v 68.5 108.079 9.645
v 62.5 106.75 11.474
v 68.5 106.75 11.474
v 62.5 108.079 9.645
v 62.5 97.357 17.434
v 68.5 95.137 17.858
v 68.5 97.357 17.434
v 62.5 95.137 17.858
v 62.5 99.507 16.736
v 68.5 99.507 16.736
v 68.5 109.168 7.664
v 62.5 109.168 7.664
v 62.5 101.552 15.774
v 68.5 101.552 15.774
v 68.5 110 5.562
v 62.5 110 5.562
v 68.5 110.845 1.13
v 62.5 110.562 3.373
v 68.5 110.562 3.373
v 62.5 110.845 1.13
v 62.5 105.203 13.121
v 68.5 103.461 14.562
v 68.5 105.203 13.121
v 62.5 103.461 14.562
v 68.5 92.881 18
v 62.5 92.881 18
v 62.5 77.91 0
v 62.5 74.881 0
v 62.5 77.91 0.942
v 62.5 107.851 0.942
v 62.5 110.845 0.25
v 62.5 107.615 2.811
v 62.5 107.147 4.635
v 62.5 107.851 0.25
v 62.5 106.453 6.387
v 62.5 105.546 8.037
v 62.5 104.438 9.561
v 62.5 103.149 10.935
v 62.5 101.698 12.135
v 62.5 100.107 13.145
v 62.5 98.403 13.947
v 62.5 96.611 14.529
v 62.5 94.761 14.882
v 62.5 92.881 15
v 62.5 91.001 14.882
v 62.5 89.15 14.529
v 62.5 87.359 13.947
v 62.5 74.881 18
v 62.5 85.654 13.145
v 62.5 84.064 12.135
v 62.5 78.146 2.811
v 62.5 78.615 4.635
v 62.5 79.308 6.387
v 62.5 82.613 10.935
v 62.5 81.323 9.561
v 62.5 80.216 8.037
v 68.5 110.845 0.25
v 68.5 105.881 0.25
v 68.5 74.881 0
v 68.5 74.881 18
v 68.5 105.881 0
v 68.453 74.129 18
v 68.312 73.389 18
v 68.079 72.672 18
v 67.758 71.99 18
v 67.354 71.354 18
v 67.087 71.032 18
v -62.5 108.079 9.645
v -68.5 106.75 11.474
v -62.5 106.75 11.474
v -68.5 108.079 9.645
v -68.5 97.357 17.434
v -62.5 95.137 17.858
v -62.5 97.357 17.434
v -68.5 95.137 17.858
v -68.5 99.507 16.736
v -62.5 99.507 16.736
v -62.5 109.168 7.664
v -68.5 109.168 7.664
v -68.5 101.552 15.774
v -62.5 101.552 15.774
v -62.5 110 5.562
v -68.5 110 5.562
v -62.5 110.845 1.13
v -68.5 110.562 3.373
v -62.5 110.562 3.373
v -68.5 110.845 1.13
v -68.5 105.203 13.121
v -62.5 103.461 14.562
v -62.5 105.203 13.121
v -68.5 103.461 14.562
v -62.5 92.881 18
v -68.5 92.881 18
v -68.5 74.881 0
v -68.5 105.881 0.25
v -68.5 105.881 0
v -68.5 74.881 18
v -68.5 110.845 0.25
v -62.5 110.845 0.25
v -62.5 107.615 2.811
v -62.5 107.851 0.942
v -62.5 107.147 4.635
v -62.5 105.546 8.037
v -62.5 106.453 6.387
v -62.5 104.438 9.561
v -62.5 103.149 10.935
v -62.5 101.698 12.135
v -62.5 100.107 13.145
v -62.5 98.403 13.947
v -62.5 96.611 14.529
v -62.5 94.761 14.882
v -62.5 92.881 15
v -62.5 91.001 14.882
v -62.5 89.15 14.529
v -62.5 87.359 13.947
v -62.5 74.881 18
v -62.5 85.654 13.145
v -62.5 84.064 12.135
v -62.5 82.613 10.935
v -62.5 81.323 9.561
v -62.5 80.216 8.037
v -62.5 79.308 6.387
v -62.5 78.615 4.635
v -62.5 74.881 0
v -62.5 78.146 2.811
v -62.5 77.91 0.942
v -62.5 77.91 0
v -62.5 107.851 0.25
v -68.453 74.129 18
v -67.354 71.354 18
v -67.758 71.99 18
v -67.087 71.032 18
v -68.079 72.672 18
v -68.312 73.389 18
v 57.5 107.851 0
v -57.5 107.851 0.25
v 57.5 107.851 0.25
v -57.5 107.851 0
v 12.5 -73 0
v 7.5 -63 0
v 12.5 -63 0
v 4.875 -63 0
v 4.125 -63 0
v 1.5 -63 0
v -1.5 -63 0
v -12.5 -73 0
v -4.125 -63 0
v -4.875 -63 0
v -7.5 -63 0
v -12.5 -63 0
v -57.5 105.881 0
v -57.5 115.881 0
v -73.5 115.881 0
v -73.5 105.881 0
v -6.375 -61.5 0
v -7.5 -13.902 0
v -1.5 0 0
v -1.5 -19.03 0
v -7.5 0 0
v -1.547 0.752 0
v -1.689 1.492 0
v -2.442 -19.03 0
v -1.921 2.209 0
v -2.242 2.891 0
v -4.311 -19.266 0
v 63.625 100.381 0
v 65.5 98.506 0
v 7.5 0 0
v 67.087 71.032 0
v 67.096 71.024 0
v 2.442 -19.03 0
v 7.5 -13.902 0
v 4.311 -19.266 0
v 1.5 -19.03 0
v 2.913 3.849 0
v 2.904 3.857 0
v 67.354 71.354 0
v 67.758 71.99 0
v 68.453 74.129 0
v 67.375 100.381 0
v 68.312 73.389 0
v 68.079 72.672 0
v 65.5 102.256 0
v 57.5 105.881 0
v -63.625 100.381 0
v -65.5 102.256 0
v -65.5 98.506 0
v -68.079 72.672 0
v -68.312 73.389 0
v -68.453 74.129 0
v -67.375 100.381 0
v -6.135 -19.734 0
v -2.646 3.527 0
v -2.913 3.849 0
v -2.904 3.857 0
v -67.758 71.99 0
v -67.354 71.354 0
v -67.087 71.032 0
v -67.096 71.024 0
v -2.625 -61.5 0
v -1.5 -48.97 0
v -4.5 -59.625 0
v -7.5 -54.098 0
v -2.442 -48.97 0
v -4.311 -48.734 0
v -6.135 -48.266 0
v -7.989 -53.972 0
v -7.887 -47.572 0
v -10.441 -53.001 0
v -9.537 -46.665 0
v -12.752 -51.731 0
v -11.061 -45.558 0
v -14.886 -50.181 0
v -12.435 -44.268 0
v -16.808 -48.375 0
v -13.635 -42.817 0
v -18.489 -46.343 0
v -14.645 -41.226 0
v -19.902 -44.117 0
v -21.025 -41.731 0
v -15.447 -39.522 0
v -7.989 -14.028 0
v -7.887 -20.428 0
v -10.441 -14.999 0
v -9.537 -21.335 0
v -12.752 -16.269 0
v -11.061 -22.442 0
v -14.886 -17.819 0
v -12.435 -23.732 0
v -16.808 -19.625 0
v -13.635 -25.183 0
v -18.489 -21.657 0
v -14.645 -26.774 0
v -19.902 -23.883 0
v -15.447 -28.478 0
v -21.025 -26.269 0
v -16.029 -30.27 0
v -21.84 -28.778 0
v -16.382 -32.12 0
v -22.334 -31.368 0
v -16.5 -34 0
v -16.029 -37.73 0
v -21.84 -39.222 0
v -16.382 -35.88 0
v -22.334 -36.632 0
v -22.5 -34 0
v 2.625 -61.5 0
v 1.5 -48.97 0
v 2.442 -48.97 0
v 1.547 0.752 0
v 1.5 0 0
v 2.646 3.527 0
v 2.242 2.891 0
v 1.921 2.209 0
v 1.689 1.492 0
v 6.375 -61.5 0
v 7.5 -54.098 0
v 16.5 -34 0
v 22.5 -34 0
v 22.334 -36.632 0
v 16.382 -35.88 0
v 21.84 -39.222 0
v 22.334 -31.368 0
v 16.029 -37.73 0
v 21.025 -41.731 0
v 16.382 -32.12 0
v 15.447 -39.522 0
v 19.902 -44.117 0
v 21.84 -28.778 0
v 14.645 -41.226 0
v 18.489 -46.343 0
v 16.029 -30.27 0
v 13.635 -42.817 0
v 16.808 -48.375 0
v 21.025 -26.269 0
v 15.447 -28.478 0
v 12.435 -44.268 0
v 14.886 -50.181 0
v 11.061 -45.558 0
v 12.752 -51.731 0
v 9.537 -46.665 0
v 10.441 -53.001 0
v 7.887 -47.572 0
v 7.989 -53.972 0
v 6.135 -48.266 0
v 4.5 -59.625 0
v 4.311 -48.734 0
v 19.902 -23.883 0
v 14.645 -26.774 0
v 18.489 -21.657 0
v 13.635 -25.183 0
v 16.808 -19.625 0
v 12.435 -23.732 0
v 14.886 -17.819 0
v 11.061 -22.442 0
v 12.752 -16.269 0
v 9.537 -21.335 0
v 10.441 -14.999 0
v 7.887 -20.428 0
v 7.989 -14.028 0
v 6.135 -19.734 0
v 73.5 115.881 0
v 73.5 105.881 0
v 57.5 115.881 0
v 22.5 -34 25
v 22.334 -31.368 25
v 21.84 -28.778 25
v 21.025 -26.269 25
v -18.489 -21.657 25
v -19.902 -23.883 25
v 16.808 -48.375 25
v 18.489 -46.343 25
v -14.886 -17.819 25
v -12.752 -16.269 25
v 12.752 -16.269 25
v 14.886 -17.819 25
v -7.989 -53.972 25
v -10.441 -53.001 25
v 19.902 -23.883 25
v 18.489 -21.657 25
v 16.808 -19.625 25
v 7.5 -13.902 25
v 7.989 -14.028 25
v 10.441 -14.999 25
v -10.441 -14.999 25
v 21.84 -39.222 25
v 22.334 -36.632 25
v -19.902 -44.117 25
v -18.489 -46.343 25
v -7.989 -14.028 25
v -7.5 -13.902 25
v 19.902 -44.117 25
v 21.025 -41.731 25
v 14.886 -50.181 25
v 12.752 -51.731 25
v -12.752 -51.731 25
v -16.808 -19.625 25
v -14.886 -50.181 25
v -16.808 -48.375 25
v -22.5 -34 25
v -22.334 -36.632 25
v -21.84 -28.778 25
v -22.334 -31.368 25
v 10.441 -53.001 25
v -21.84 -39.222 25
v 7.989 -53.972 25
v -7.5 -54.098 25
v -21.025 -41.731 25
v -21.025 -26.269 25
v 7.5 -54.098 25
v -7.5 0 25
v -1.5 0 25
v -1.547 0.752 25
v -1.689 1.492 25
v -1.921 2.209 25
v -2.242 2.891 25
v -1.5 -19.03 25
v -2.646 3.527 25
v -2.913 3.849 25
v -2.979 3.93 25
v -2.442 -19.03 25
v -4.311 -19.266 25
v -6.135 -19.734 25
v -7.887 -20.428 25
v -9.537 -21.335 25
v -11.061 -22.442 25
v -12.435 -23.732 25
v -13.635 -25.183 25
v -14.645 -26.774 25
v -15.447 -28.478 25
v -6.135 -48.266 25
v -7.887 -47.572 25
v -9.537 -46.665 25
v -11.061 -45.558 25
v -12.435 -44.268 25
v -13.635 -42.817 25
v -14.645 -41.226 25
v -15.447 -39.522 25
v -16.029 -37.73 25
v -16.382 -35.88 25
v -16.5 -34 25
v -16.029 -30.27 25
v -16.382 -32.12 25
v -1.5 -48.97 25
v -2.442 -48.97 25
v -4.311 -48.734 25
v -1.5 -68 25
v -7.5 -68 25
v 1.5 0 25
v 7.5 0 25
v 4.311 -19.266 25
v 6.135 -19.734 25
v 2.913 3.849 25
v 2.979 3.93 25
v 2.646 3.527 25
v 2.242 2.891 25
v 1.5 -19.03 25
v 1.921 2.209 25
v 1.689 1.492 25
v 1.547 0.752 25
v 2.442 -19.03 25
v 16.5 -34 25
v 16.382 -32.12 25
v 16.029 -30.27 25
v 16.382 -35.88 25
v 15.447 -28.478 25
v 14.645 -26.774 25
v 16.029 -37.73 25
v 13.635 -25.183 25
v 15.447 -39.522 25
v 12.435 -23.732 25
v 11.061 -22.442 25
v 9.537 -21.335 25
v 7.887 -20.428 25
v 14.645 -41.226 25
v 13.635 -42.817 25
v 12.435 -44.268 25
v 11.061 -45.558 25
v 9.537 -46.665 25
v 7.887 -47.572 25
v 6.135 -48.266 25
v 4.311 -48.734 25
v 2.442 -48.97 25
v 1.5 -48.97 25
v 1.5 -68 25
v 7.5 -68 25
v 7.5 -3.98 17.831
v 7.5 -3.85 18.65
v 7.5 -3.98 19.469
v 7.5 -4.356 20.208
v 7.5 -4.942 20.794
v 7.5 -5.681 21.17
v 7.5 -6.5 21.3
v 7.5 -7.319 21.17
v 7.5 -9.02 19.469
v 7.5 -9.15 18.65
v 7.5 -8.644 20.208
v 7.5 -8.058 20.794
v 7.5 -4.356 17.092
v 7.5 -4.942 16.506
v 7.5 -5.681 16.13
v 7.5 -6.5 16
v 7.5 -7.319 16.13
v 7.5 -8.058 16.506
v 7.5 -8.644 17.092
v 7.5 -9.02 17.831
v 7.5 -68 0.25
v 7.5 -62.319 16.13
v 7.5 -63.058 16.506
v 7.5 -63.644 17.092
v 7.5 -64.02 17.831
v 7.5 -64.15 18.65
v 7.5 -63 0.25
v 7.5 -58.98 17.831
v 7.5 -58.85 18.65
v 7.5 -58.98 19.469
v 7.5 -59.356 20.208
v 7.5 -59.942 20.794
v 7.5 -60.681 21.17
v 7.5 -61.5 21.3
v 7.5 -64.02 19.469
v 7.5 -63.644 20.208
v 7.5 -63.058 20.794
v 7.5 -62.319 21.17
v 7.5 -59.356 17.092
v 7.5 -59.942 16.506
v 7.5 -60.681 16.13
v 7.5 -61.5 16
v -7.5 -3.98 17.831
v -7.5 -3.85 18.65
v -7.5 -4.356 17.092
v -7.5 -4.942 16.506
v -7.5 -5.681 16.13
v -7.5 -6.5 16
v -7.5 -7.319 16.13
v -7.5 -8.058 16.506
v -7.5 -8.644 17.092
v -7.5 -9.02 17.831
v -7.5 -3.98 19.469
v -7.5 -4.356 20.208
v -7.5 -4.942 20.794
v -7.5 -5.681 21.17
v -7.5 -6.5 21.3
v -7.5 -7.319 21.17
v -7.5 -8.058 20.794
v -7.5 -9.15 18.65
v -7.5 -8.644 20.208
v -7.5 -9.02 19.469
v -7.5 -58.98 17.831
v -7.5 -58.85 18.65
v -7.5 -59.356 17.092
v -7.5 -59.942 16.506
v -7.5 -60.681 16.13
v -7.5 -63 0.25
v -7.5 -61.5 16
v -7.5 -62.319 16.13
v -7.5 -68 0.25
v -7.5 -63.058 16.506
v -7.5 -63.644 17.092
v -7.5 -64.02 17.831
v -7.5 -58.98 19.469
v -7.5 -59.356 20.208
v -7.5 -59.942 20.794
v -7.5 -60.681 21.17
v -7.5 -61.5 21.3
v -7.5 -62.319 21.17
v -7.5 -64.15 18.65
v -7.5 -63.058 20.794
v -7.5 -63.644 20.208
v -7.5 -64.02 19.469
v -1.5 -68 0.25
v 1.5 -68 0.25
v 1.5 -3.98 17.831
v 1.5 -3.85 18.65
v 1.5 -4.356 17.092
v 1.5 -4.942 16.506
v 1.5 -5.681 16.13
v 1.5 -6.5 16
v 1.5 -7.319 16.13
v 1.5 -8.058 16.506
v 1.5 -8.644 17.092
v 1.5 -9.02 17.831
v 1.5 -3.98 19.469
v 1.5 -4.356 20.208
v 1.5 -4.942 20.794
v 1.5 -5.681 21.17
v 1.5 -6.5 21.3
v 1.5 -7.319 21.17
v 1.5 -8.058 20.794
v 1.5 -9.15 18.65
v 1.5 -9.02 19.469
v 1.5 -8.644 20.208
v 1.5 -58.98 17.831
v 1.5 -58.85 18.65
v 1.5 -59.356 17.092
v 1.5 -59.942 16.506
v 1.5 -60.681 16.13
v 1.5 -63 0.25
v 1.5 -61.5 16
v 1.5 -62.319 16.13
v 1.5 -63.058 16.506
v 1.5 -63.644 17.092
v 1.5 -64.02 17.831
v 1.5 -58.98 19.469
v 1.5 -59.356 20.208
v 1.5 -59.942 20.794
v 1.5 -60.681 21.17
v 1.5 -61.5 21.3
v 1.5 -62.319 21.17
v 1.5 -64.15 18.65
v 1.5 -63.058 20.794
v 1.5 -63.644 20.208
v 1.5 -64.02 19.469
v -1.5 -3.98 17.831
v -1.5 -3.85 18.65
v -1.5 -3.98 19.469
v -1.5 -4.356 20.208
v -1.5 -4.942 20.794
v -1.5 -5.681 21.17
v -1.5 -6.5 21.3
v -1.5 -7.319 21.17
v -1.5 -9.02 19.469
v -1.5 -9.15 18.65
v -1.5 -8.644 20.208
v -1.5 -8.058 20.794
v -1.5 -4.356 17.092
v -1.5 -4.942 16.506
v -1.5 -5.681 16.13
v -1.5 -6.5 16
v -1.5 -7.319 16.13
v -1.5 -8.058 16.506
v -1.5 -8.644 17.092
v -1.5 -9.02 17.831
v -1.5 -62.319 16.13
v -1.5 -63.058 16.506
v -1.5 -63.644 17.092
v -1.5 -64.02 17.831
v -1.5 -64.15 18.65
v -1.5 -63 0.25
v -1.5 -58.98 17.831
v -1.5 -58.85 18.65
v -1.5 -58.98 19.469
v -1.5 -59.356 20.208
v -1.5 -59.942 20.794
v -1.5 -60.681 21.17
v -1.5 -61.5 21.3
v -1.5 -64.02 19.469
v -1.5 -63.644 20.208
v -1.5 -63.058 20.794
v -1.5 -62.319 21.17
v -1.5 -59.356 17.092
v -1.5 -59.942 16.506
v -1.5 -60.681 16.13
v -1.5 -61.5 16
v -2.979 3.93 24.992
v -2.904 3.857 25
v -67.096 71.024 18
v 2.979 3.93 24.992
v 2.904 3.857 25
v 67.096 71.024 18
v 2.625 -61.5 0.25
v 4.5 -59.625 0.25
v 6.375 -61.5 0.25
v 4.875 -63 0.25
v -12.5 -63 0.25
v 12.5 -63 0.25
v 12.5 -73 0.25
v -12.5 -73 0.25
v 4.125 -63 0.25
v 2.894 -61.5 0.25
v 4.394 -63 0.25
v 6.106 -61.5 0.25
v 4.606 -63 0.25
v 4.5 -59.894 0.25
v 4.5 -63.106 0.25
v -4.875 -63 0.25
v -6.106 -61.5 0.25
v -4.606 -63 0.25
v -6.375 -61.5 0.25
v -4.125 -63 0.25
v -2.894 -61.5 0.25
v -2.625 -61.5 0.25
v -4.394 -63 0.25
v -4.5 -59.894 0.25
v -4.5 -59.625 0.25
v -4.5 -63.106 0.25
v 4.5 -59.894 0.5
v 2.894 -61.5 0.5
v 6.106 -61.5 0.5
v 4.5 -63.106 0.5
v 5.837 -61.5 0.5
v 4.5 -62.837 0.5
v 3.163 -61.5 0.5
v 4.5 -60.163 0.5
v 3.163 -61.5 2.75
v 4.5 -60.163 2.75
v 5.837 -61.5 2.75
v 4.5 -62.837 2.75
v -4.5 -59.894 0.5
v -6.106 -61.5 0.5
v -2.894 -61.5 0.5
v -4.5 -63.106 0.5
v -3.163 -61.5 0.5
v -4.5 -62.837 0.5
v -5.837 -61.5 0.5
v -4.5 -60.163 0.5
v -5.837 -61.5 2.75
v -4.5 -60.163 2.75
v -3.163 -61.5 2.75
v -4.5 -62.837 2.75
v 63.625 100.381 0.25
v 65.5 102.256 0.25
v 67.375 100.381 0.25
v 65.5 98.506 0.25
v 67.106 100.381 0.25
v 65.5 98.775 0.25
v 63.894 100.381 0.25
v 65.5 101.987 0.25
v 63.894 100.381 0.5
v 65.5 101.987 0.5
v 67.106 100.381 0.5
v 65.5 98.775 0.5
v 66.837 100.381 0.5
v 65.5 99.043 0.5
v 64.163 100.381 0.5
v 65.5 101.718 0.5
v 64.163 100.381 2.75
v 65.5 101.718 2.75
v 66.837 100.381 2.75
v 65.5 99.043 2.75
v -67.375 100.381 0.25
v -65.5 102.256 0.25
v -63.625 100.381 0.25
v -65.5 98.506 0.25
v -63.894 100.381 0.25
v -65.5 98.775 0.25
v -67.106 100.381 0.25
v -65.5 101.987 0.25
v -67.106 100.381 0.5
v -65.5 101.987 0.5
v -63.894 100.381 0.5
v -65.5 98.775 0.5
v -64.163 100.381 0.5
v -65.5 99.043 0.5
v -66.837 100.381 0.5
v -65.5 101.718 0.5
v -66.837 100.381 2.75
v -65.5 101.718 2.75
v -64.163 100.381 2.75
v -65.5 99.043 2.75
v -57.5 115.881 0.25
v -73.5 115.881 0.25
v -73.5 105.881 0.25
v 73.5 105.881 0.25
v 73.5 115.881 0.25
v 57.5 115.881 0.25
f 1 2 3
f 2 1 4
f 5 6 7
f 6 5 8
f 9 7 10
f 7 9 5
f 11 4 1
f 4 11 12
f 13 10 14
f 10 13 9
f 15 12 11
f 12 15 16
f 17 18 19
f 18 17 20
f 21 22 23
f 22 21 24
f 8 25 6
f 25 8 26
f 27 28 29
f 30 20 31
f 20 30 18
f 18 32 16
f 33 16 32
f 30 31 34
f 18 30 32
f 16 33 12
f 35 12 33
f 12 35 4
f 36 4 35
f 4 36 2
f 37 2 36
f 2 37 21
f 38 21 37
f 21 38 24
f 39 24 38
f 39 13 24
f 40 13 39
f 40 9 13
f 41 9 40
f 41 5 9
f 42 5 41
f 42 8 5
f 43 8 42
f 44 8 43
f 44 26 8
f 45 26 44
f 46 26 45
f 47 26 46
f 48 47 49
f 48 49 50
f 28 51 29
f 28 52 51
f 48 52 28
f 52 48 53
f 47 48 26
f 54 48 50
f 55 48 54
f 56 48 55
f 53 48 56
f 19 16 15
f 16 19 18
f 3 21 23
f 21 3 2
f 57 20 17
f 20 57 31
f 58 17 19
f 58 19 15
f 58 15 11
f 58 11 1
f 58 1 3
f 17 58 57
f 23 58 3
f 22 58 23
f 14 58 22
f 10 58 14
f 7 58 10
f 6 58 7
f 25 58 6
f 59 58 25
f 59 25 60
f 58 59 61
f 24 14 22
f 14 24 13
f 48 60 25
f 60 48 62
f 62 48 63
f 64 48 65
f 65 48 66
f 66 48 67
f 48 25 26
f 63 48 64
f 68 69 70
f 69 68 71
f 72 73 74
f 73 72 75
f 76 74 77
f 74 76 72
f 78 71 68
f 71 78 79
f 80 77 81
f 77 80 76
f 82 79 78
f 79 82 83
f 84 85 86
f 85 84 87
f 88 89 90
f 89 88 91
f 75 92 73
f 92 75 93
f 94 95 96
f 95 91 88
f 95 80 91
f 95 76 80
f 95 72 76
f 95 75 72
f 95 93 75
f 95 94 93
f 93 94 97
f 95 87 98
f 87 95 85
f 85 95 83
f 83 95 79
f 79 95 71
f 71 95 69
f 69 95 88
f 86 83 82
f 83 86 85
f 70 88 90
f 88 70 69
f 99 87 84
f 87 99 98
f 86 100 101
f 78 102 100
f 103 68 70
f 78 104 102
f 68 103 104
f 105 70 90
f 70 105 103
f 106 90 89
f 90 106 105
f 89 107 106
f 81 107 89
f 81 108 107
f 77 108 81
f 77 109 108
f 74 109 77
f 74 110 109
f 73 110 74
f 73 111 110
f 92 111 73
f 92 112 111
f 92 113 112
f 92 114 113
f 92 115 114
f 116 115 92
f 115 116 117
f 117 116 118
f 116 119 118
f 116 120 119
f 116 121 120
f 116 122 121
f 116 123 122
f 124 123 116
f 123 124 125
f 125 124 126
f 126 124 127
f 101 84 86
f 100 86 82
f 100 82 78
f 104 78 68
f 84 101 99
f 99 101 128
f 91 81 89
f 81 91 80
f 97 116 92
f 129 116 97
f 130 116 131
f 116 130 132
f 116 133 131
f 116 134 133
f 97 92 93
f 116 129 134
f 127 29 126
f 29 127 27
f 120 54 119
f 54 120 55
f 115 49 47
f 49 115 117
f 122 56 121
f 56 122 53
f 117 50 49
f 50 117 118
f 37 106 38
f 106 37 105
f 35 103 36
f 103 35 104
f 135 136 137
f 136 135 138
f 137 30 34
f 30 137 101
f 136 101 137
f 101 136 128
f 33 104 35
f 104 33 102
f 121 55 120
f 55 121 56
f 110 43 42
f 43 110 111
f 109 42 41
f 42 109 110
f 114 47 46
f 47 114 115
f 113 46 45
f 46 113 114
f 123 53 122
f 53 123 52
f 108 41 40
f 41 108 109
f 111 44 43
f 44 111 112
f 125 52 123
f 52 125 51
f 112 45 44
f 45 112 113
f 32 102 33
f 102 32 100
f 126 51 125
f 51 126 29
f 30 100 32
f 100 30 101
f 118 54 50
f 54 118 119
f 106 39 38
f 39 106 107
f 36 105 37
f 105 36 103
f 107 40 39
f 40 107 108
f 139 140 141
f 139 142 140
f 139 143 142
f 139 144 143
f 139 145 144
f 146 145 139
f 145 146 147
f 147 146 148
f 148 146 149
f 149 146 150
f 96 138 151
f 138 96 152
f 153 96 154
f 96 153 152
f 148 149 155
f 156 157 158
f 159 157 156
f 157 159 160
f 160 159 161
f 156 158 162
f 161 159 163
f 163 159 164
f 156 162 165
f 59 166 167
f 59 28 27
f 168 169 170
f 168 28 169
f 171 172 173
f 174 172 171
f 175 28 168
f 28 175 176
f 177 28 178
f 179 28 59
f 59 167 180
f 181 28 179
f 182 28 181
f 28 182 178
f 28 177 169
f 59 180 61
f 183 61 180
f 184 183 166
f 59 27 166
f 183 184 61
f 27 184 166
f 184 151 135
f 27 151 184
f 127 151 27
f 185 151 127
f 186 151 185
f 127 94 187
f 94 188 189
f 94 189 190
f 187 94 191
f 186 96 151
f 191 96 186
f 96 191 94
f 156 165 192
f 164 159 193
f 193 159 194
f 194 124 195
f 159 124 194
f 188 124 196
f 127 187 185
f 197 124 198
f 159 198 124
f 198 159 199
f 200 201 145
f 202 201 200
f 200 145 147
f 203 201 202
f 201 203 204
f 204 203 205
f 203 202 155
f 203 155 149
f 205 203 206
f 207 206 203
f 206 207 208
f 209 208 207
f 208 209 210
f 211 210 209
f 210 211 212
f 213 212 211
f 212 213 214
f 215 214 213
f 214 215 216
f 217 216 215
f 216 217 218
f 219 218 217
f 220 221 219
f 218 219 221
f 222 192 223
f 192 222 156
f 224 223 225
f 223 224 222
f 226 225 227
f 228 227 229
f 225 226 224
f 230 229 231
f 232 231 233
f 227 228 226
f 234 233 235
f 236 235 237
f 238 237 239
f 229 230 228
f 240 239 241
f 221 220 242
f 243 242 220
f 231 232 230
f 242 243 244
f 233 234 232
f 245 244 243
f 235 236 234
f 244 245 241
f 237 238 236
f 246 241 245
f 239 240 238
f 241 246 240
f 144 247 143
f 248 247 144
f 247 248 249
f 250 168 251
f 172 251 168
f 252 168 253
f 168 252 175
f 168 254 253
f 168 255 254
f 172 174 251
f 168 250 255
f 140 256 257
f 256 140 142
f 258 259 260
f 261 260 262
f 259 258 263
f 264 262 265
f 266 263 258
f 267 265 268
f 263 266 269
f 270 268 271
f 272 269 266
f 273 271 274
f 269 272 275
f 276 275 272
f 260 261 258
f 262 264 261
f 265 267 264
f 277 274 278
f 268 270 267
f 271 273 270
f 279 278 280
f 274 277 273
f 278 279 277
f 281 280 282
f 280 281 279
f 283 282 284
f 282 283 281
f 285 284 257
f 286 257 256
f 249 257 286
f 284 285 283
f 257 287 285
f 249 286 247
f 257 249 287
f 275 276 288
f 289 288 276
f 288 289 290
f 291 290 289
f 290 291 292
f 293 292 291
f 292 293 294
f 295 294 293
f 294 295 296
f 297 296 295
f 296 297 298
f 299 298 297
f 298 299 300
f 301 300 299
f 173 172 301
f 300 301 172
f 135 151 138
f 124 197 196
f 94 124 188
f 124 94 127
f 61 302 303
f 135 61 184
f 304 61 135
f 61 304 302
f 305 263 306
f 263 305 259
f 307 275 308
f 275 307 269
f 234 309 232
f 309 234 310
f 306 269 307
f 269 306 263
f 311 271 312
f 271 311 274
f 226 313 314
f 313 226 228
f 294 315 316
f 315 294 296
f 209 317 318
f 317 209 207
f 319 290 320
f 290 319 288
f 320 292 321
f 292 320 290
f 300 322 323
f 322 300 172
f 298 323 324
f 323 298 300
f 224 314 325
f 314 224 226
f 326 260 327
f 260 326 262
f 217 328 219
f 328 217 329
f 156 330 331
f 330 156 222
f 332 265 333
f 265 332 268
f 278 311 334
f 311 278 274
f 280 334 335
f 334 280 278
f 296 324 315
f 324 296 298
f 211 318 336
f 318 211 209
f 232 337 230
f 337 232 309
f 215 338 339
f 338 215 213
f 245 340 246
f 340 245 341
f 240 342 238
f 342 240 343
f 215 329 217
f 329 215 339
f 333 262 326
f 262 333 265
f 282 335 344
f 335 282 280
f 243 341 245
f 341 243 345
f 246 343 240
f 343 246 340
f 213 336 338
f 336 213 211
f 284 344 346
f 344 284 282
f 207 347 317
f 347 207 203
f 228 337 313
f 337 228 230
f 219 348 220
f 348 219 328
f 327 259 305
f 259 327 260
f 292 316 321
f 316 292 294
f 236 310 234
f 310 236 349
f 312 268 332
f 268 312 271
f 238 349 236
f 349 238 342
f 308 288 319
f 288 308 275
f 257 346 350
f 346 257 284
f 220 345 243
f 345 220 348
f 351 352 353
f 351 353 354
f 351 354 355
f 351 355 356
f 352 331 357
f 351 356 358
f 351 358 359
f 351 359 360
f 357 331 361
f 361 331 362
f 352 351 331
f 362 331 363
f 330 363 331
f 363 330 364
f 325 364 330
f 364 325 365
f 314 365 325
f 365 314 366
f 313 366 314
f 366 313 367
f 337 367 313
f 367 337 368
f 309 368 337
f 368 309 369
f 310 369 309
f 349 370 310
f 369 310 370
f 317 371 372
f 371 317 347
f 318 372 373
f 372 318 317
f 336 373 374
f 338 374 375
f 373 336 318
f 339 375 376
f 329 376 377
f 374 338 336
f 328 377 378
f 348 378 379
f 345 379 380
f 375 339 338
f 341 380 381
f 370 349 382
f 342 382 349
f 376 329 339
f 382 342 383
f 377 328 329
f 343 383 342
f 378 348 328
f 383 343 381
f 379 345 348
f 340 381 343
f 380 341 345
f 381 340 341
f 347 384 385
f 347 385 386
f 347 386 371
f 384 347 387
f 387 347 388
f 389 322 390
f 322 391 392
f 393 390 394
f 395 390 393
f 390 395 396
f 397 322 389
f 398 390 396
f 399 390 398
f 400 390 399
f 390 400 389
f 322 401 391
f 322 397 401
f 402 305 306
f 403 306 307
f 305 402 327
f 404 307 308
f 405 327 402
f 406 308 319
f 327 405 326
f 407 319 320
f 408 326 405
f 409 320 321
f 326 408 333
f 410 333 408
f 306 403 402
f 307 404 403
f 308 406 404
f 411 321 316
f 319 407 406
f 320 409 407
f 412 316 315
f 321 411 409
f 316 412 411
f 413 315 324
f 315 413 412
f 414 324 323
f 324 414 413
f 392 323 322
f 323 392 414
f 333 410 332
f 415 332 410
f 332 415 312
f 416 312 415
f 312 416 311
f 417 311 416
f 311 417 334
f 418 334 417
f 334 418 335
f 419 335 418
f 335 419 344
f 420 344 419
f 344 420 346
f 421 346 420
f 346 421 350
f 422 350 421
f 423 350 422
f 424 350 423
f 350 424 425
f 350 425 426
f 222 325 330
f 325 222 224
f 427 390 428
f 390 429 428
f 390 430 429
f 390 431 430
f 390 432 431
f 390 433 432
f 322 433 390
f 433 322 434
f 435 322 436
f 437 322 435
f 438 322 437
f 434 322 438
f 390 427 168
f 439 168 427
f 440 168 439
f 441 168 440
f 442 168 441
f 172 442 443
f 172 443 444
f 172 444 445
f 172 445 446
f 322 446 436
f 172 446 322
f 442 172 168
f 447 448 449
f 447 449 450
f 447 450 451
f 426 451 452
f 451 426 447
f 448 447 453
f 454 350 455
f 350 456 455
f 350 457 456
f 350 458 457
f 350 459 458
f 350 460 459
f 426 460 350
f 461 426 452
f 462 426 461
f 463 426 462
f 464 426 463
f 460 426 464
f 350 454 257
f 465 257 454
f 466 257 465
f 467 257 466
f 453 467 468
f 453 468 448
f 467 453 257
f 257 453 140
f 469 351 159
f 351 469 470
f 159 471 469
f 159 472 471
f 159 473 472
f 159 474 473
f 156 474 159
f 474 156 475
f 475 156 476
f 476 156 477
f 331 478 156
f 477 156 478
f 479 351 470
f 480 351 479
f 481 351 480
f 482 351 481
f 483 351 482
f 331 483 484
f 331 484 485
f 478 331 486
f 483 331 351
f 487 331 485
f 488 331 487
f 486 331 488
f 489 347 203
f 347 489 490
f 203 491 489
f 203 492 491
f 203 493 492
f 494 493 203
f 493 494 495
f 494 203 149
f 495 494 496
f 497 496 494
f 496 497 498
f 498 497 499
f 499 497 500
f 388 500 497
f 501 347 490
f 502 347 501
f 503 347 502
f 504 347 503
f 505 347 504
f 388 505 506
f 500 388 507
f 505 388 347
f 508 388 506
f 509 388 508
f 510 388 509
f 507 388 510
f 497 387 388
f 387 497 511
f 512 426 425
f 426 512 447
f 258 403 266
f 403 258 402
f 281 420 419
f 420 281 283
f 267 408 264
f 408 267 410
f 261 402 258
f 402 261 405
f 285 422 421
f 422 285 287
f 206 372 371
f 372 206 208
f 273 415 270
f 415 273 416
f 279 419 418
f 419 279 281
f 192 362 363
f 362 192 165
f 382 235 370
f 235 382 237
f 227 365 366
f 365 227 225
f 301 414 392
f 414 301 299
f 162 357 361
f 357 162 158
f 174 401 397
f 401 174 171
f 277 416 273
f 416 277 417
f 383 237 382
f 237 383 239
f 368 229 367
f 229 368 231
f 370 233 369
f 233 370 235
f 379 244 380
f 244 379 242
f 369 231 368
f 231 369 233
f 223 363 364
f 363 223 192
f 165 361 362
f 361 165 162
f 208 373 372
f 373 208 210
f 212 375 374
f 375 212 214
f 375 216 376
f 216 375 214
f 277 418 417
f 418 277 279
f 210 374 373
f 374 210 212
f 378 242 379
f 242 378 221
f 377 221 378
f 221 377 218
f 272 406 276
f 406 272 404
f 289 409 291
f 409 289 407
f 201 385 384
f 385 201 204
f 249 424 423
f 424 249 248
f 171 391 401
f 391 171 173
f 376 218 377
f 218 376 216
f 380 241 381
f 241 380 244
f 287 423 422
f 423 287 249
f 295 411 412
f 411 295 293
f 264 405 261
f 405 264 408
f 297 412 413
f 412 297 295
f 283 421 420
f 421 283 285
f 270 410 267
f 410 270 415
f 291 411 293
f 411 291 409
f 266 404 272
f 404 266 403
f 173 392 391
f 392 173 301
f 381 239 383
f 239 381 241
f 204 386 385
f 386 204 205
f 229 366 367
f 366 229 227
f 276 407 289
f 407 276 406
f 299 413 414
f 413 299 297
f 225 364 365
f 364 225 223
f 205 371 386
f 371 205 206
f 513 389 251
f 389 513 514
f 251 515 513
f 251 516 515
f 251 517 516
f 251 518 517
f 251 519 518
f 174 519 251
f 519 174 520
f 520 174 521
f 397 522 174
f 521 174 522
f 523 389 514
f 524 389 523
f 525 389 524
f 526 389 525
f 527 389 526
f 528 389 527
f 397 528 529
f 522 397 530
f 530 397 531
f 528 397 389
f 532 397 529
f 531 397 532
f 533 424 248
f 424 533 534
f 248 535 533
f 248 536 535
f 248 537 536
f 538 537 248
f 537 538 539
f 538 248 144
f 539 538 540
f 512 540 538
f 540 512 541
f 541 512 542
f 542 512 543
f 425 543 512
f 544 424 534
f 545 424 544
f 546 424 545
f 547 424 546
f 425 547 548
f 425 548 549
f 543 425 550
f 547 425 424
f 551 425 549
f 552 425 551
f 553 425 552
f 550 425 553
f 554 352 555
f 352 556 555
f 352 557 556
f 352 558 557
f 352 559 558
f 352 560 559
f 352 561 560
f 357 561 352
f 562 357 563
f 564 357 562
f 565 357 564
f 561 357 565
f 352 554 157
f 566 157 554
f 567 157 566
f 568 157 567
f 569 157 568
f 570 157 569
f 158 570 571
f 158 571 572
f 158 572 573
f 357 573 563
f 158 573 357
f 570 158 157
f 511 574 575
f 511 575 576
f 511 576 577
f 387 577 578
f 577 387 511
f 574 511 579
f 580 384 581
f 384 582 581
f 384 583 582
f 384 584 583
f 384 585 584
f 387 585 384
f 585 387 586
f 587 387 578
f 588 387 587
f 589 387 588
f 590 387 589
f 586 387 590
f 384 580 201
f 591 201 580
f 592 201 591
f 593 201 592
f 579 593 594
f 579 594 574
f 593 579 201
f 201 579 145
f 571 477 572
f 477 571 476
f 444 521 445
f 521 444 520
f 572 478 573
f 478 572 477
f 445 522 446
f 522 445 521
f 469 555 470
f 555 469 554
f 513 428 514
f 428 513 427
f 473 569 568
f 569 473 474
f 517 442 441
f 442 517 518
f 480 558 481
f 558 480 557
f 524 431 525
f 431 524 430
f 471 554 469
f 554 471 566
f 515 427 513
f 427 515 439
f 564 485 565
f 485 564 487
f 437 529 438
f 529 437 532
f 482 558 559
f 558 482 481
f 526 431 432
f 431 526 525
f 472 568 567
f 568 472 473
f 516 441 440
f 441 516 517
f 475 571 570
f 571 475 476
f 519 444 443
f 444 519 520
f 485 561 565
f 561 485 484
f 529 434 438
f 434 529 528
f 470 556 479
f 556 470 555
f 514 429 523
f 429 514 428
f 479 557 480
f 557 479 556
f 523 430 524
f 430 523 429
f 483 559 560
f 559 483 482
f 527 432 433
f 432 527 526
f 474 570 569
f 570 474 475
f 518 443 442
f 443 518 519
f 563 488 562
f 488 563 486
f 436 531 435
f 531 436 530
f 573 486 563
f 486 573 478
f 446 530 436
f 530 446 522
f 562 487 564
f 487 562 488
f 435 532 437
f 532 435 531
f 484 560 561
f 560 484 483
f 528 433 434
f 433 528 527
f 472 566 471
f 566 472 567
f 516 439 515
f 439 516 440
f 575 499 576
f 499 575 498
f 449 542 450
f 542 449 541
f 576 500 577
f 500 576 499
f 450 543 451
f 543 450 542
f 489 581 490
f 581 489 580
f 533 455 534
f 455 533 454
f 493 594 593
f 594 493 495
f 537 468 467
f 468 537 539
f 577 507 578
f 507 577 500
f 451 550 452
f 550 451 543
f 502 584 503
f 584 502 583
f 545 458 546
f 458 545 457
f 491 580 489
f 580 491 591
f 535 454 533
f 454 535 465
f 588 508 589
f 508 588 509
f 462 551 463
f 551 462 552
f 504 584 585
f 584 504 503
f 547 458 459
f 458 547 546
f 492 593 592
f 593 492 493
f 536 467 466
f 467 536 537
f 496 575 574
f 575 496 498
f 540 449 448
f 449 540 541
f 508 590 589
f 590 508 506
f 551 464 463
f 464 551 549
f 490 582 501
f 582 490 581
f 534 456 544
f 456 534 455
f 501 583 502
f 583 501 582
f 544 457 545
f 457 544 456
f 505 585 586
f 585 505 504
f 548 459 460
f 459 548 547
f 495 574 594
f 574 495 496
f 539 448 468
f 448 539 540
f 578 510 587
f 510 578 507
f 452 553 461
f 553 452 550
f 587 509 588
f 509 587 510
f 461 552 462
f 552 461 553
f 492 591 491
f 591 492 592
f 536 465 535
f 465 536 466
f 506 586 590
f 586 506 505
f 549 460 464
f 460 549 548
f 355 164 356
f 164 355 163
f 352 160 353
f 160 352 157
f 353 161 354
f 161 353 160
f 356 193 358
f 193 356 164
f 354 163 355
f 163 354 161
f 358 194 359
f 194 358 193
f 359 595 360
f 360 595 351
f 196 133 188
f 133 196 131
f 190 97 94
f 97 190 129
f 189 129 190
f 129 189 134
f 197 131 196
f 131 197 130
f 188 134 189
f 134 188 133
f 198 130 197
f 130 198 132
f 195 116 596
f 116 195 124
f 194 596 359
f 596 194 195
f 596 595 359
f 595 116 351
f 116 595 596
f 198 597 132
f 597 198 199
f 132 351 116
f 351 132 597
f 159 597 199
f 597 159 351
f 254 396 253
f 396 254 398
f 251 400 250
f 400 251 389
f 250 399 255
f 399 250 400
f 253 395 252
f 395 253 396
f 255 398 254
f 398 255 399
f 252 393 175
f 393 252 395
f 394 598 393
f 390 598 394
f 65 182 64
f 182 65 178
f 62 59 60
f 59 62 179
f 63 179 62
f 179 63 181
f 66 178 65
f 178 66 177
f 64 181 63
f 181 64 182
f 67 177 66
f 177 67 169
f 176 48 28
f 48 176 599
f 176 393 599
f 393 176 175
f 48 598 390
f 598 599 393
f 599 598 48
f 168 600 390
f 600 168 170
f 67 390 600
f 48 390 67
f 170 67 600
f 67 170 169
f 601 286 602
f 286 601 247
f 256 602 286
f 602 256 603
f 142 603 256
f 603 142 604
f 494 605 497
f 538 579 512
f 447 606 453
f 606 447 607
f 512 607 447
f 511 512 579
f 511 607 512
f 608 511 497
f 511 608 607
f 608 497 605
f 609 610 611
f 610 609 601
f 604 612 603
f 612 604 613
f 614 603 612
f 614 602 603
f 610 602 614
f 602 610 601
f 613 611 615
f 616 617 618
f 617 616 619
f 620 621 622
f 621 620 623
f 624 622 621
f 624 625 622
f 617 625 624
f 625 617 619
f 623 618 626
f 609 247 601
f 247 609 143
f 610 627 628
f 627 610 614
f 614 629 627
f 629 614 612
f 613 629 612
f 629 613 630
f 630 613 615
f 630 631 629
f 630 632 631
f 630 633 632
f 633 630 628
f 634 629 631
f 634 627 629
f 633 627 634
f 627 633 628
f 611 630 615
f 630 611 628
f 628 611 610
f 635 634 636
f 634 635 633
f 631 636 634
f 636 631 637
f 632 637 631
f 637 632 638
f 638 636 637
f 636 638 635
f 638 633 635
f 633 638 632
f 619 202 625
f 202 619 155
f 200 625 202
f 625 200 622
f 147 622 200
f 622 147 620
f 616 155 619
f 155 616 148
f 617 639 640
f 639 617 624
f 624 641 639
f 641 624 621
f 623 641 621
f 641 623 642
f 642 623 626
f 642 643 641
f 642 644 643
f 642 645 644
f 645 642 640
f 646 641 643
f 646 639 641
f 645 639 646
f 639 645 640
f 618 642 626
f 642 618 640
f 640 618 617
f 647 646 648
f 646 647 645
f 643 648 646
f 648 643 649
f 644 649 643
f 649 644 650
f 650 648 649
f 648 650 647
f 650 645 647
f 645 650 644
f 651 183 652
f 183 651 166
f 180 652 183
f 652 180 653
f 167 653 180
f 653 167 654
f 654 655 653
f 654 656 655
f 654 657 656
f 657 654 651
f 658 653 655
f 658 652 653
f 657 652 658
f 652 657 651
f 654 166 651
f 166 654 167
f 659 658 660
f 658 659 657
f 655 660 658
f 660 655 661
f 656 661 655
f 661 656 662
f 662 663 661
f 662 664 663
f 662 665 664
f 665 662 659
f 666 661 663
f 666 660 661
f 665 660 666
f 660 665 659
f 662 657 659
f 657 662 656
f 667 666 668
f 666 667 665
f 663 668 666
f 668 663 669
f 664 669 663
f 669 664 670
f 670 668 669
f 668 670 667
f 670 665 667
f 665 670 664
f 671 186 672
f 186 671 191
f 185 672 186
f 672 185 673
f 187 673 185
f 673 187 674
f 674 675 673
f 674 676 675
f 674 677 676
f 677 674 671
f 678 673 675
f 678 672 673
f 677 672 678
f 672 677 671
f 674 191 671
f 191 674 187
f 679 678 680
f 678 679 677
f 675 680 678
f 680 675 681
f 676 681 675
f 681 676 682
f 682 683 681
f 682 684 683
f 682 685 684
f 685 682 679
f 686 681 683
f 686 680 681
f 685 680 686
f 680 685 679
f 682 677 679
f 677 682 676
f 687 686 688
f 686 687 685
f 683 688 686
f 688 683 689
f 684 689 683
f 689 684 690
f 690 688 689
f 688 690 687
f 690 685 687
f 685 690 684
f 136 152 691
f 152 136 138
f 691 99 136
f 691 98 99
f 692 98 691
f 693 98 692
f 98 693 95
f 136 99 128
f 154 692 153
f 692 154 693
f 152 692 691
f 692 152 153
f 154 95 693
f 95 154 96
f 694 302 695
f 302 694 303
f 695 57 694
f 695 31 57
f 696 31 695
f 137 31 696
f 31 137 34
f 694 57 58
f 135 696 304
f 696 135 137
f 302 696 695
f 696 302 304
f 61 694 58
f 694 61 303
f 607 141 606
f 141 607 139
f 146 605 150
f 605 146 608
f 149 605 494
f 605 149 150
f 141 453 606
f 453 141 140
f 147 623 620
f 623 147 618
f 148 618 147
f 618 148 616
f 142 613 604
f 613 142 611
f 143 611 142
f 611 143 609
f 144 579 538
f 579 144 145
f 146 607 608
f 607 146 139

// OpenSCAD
/* [General] */

// "whole" gives you the entire part, to be printed as a piece. It can be difficult to print. "split" gives you the top half of the part, for you to print twice and glue together.
layout = "split"; // [whole, split]

// Thickness of all the walls except the handle cylinder.
wall_thickness = 6;

// Specify the diameter of your filament. Holes are provided for alignment pins to aid in gluing, if printing in halves. Put in pieces of filament in the alignment holes to help you glue the halves. If you're going to do this, measure your filament.
pin_diameter = 1.75;

// Extra clearance for alignment pins.
hole_clearance = 0.1;

// Also need to know the layer height you are printing at.
layer_height = 0.25;

// And the extrusion width.
extrusion_width = 0.38;

/* [Handle] */
handle_length = 125;
handle_outer_diameter = 30;

// Determines size of hole in handle. If you don't want a hole in the handle, make this greater than or equal to handle_outer_diameter / 2.
handle_wall_thickness = 15;

// Set this to zero to require fewer supports if printing as one piece.
handle_flange_border = 3;

/* [Clamp] */
// Diameter of the thing you're going to be clamping onto.
clamp_inner_diameter = 30;

// Setting clamp_length to handle_outer_diameter + 2*handle_flange_border will reduce the number of supports required.
clamp_length = 50; 

// Resting distance between the clamps. Don't make this too big, or you won't be able to bring the clamps together properly. Too small, though, and you may not be able to get it around your object. Partly depends on the material you are using, and the wall thickness you have chosen.
clamp_gap = 3;

// #10 screws
screw_od = 5.1;

// and #10 washers
washer_od = 12.7;

// Allow enough space to fit your washers. Wing nut screws may require some more clearance.
clamp_flange_length = 13;

// Angle from vertical for the sidewalls.
side_angle = 40;

/* [Hidden] */
// To avoid coincident faces.
slop = 1;
$fn = 50;
clamp_outer_diameter = clamp_inner_diameter + 2 * wall_thickness;


module screw() {
    rotate([0, 90, 0])
    cylinder(r = screw_od/2 + hole_clearance, h = clamp_gap + 2*wall_thickness + 2*slop, center = true, $fn = 20);
}

module clamp() {
  screw_z = clamp_length/2 - washer_od/2;
  screw_y = clamp_inner_diameter/2 + wall_thickness + clamp_flange_length / 2;

  difference() {
    union() {
      // Clamp outside shell
      hull() {
        translate([-clamp_gap/2, 0, 0])
        cylinder(h = clamp_length, r = clamp_outer_diameter/2, center = true);

        translate([clamp_gap/2, 0, 0])
        cylinder(h = clamp_length, r = clamp_outer_diameter/2, center = true);
      }

      // Flange
      cube([clamp_gap + 2*wall_thickness, clamp_outer_diameter + 2*clamp_flange_length, clamp_length], center = true);
    }
    // Clamp hole
    hull() {
      translate([-clamp_gap/2, 0, 0])
      cylinder(h = clamp_length + slop, r = clamp_inner_diameter/2, center = true);

      translate([clamp_gap/2, 0, 0])
      cylinder(h = clamp_length + slop, r = clamp_inner_diameter/2, center = true);
    }

    // Gap
    cube([clamp_gap, clamp_outer_diameter + 2*clamp_flange_length + slop, clamp_length + slop], center = true);

    // Screw holes
    translate([0, screw_y, screw_z]) screw();
    translate([0, screw_y, -screw_z]) screw();    
    translate([0, -screw_y, screw_z]) screw();
    translate([0, -screw_y, -screw_z]) screw();
  }
}

handle_flange_length = handle_outer_diameter + 2*handle_flange_border;

module handle_flange() {
  cylinder(h = wall_thickness, r = handle_flange_length/2);

  translate([-handle_flange_length/2, -handle_flange_length/2, 0])
  cube([handle_flange_length, handle_flange_length/2, wall_thickness]);
}

module handle() {
  translate([0, handle_flange_length/2, 0])
  rotate([0, 90, 0])
  difference() {
    union() {
      // Handle outer shell
      cylinder(h = handle_length, r = handle_outer_diameter/2, center = true);

      // Flanges
      translate([0, 0, handle_length/2])
      handle_flange();

      translate([0, 0, -handle_length/2 - wall_thickness])
      handle_flange();
    }
    cylinder(h = handle_length + 2*wall_thickness + slop, r = handle_outer_diameter/2 - handle_wall_thickness, center = true);
    cube([handle_outer_diameter + 2*wall_thickness, ]);
  }
}

// We want the side walls to coincide with the outside corner of the clamp, but the inside corner of the handle.
// Math is hard.
W = wall_thickness / cos(side_angle);
x = W - wall_thickness;
clamp_y_intercept = (handle_length - clamp_gap) / 2 / tan(side_angle) + x / tan(side_angle);

//Title: Wedge Module
//Author: Alex English - ProtoParadigm
//Date: 1/4/2013
//License: Creative Commons - Share Alike - Attribution

//Usage: Include in your other .scad projects and call wedge with arguments for the height of the wedge, the radius of the wedge, and the angle of the wedge in degrees.  The resulting wedge will be placed with the point at the origin, extending into the z axis, with the angle starting at the x axis and extending counter-clockwise as per the right-hand rule.

//Updated: 1/12/2013 - Increased dimensions of wedge to be revoved when angle is more than 180 as per suggestion from kitwallace.

module wedge_180(h, r, d)
{
  rotate(d) difference()
  {
    rotate(180-d) difference()
    {
      cylinder(h = h, r = r);
      translate([-(r+1), 0, -1]) cube([r*2+2, r+1, h+2]);
    }
    translate([-(r+1), 0, -1]) cube([r*2+2, r+1, h+2]);
  }
}

module wedge(h, r, d)
{
  if(d <= 180)
    wedge_180(h, r, d);
  else
    rotate(d) difference()
    {
      cylinder(h = h, r = r);
      translate([0, 0, -1]) wedge_180(h+2, r+1, 360-d);
    }
}

module side_wall() {
  side_length = clamp_y_intercept / cos(side_angle) - W * sin(side_angle);

  translate([-handle_length/2, clamp_y_intercept])
  rotate([90, 0, -(90 - side_angle)])
  linear_extrude(height = wall_thickness)
  polygon([
    [0, handle_flange_length/2],
    [side_length, clamp_length/2],
    [side_length, -clamp_length/2],
    [0, -handle_flange_length/2]
  ]);

  translate([-clamp_gap/2 - wall_thickness, 0, -clamp_length/2])
  wedge(h = clamp_length, r = wall_thickness, d = side_angle + 1);

  translate([-handle_length/2, clamp_y_intercept, -handle_flange_length/2])
  rotate([0, 0, 180])
  wedge(h = handle_flange_length, r = wall_thickness, d = side_angle + 1);
}

//-- Locating pin hole with glue recess
// http://softsolder.com/2013/11/12/improved-alignment-pin-hole-for-split-3d-prints/ 

module PolyCyl(Dia,Height,ForceSides=0) {           // based on nophead's polyholes
  Sides = (ForceSides != 0) ? ForceSides : (ceil(Dia) + 2);
  FixDia = Dia / cos(180/Sides);
  cylinder(r=FixDia/2 + hole_clearance,
           h=Height,
           $fn=Sides);
}

module LocatingPin(Dia=pin_diameter,Len=5.00) {
   
  translate([0,0,-layer_height])
  PolyCyl((Dia + 2*extrusion_width),2*layer_height,4);
   
  translate([0,0,-2*layer_height])
  PolyCyl((Dia + 1*extrusion_width),4*layer_height,4);
   
  translate([0,0,-(Len/2 + layer_height)])
  PolyCyl(Dia,(Len + 2*layer_height),4);
}

module part() {
  translate([0, clamp_y_intercept, 0])
  handle();

  translate([0, -clamp_outer_diameter/2 - clamp_flange_length, 0])
  clamp();

  side_wall();
  mirror([1, 0, 0]) side_wall();
}

module tabs() {
  top_left_y = clamp_y_intercept + handle_flange_length;
  top_left_x = -handle_length/2 - wall_thickness;

  translate([top_left_x - 5, top_left_y - 5, 0])
  cube([10 + wall_thickness, 10, layer_height]);

  translate([handle_length/2 - 5, top_left_y - 5, 0])
  cube([10 + wall_thickness, 10, layer_height]);

  translate([-(clamp_gap/2 + wall_thickness + 5), -(2*clamp_flange_length + 2*wall_thickness + clamp_inner_diameter + 5), 0])
  cube([10 + 2*wall_thickness + clamp_gap, 10, layer_height]);
}

module split() {
  difference() {
    part();
    translate([-200, -200, -100])
    cube([400, 400, 100]);

    translate([clamp_gap/2 + wall_thickness/2, -(1.5*clamp_flange_length + 2*wall_thickness + clamp_inner_diameter)])
    LocatingPin();

    translate([-(clamp_gap/2 + wall_thickness/2), -(1.5*clamp_flange_length + 2*wall_thickness + clamp_inner_diameter)])
    LocatingPin();

    translate([(handle_length + wall_thickness)/2, clamp_y_intercept + handle_flange_length - handle_flange_border - handle_wall_thickness/2, 0])
    LocatingPin();

    translate([-(handle_length + wall_thickness)/2, clamp_y_intercept + handle_flange_length - handle_flange_border - handle_wall_thickness/2, 0])
    LocatingPin();
  }
  tabs();
}

if (layout == "whole") part();
else split();
